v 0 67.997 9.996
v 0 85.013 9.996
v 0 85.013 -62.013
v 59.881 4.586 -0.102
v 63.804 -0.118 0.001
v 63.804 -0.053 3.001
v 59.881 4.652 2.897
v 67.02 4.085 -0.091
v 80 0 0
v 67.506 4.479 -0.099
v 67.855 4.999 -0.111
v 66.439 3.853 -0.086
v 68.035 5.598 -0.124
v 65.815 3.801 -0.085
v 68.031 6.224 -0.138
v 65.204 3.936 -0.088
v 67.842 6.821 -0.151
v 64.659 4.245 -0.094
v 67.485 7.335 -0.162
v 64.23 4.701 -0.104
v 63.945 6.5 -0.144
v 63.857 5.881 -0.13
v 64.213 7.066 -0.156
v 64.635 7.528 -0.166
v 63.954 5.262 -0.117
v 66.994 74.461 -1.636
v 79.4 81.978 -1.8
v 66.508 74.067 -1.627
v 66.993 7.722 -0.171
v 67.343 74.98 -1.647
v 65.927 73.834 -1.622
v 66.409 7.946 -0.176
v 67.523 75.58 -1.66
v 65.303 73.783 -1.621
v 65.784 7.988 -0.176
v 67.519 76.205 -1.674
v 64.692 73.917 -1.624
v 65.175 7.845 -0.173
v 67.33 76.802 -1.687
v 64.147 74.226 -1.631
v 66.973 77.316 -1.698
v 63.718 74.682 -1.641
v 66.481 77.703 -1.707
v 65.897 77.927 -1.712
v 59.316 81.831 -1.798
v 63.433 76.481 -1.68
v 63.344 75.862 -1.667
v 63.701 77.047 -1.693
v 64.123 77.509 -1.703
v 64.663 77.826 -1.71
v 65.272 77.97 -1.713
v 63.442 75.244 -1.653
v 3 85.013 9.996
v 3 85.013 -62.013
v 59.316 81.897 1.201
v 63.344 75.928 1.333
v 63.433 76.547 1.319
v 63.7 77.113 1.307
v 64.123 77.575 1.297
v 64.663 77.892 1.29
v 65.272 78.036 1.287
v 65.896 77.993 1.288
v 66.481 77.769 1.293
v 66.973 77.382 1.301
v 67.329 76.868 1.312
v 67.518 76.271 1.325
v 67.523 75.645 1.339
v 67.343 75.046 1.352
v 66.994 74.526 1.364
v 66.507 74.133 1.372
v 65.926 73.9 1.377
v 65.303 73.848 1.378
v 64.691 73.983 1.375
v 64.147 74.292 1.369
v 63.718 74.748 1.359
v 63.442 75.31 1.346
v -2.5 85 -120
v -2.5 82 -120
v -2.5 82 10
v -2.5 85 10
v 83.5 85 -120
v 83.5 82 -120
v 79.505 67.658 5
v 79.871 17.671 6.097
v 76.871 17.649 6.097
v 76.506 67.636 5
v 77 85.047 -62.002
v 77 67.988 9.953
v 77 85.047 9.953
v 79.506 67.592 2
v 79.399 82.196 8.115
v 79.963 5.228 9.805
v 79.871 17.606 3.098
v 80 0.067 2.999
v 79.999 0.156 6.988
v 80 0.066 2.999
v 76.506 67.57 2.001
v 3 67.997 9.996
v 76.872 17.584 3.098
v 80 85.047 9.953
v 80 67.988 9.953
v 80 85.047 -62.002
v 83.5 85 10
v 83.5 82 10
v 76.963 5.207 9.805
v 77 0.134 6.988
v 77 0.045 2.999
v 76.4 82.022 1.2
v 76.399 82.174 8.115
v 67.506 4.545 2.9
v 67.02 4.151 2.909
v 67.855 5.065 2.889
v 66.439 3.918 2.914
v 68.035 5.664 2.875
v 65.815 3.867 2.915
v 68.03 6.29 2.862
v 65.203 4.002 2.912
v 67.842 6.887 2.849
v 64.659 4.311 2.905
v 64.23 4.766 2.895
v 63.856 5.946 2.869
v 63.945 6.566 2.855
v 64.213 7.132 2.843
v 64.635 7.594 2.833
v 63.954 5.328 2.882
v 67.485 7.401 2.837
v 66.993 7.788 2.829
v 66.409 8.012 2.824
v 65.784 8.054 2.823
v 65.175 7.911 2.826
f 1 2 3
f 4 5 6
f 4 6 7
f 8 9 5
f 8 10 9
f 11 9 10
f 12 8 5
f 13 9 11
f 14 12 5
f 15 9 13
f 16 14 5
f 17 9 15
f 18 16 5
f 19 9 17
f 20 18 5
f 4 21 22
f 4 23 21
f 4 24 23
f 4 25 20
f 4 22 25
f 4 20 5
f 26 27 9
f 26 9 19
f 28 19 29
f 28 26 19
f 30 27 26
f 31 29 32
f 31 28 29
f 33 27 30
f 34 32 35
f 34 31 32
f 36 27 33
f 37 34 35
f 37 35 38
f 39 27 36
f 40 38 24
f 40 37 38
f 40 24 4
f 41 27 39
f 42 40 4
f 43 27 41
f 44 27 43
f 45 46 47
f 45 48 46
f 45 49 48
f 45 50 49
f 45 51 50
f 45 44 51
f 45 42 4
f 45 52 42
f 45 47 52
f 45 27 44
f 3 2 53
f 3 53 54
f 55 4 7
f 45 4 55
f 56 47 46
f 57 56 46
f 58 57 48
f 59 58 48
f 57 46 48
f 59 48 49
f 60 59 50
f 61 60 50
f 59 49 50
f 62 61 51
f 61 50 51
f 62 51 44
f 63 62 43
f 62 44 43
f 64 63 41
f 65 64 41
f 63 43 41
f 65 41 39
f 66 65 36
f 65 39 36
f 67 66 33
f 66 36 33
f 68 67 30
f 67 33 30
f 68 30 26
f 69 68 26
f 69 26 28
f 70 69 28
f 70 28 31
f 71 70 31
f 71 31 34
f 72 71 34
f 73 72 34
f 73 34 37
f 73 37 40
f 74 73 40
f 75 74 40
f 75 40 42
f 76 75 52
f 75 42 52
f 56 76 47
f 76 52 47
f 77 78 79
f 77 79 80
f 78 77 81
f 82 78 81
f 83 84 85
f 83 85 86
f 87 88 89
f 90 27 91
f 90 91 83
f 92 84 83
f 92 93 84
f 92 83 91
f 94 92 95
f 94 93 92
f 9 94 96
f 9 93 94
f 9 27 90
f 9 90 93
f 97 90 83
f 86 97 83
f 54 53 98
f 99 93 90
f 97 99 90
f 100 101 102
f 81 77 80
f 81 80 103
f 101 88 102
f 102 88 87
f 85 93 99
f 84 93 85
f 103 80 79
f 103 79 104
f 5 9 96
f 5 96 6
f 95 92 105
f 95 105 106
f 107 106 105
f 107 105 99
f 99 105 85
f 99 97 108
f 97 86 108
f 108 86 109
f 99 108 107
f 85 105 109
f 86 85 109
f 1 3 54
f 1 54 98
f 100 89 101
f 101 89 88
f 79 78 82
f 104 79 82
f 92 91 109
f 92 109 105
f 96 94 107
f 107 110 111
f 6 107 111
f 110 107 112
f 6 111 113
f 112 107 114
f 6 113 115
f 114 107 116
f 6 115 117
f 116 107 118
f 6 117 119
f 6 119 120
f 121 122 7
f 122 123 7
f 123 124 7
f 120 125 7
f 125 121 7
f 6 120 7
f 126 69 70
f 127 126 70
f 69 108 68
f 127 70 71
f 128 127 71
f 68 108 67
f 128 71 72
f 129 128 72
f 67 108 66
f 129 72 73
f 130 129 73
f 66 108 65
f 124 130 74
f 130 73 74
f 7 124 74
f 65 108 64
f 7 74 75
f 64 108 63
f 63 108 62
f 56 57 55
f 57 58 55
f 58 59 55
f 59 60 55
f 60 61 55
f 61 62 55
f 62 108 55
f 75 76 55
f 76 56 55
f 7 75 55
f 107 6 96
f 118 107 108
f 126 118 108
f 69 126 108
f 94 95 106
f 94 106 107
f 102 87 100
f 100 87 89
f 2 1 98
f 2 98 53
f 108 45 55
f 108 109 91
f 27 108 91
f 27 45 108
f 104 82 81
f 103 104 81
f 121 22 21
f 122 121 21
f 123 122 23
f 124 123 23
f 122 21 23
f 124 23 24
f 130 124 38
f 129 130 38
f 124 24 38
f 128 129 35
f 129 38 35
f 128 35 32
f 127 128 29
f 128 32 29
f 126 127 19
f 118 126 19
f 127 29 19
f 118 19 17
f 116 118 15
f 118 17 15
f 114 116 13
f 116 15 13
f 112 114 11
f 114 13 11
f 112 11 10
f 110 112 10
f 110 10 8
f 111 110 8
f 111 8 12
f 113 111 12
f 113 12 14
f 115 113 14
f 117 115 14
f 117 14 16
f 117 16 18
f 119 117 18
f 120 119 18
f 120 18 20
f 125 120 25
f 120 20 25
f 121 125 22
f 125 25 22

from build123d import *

# Parameters (mm, degrees)
BOX_W                          = 86
BOX_H                          = 3
BOX_DEPTH                      = 130
PAD002_DEPTH                   = 3
PAD003_DEPTH                   = 3
SKETCH001_W                    = 50
SKETCH001_H                    = 3
PAD001_DEPTH                   = 3
SKETCH_R                       = 2.1
PAD_DEPTH                      = 3
FUSION_ROLL_ANGLE              = -1.257497
FUSION_PITCH_ANGLE             = -0.0046
FUSION_PLACEMENT_ANGLE         = -0.419135
PART_MIRRORING_PLACEMENT_ANGLE = 180


with BuildPart() as cube:
    # Box → Box (new body)
    with BuildSketch(Plane(origin=(-2.5, 82, -120), x_dir=(1, 0, 0), z_dir=(0, 0, 1))):
        with Locations((43, 1.5)):
            Rectangle(BOX_W, BOX_H)
    extrude(amount=BOX_DEPTH)


with BuildPart() as pad002:
    # Sketch002 → Pad002 (new body)
    with BuildSketch(Plane.YZ.offset(77)):
        Polygon((85.047287, 9.953191), (67.988335, 9.953191), (85.047287, -62.001831), align=None)
    extrude(amount=PAD002_DEPTH)


with BuildPart() as pad003:
    # Sketch003 → Pad003 (new body)
    with BuildSketch(Plane.YZ):
        Polygon((85.01265, 9.995716), (85.01265, -62.012833), (67.996574, 9.995716), align=None)
    extrude(amount=PAD003_DEPTH)


with BuildPart() as pad001:
    # Sketch001 → Pad001 (new body)
    with BuildSketch(Plane.YZ):
        Polygon((0, 0), (82, 0), (82, 9.916925), (5.012171, 9.916925), (0.002224, 6.989799), align=None)
        with Locations((42.5338, 4.983344)):
            Rectangle(SKETCH001_W, SKETCH001_H, mode=Mode.SUBTRACT)
    extrude(amount=PAD001_DEPTH)


with BuildPart() as fusion:
    # Sketch → Pad (new body)
    with BuildSketch(Plane.XY):
        Polygon((0, 82), (0, 0), (16.196529, 0), (20.084774, 4.734186), (20.084774, 82), align=None)
        with Locations((14, 6)):
            Circle(SKETCH_R, mode=Mode.SUBTRACT)
        with Locations((14, 76)):
            Circle(SKETCH_R, mode=Mode.SUBTRACT)
    extrude(amount=PAD_DEPTH)

    # Fusion: union Pad001
    add(pad001.part)


with BuildPart() as fusion_1:
    # Fusion roll: moved
    add(fusion.part.rotate(Axis((0, 0, 0), (1, 0, 0)), FUSION_ROLL_ANGLE))


with BuildPart() as fusion_2:
    # Fusion pitch: moved
    add(fusion_1.part.rotate(Axis((0, 0, 0), (0, 1, 0)), FUSION_PITCH_ANGLE))


with BuildPart() as fusion_3:
    # Fusion placement: moved
    add(fusion_2.part.rotate(Axis((0, 0, 0), (0, 0, 1)), FUSION_PLACEMENT_ANGLE))


with BuildPart() as part_mirroring:
    # Part__Mirroring: instance of Fusion
    add(fusion_3.part.mirror(Plane(origin=(0, 0, 0), x_dir=(0, 1, 0), z_dir=(0, 0, 1))))


with BuildPart() as part_mirroring_1:
    # Part__Mirroring placement: moved
    add(part_mirroring.part.moved(Location((80, 0, 0))).rotate(Axis((80, 0, 0), (0, 1, 0)), PART_MIRRORING_PLACEMENT_ANGLE))


solid = Compound([cube.part, pad002.part, pad003.part, part_mirroring_1.part])
